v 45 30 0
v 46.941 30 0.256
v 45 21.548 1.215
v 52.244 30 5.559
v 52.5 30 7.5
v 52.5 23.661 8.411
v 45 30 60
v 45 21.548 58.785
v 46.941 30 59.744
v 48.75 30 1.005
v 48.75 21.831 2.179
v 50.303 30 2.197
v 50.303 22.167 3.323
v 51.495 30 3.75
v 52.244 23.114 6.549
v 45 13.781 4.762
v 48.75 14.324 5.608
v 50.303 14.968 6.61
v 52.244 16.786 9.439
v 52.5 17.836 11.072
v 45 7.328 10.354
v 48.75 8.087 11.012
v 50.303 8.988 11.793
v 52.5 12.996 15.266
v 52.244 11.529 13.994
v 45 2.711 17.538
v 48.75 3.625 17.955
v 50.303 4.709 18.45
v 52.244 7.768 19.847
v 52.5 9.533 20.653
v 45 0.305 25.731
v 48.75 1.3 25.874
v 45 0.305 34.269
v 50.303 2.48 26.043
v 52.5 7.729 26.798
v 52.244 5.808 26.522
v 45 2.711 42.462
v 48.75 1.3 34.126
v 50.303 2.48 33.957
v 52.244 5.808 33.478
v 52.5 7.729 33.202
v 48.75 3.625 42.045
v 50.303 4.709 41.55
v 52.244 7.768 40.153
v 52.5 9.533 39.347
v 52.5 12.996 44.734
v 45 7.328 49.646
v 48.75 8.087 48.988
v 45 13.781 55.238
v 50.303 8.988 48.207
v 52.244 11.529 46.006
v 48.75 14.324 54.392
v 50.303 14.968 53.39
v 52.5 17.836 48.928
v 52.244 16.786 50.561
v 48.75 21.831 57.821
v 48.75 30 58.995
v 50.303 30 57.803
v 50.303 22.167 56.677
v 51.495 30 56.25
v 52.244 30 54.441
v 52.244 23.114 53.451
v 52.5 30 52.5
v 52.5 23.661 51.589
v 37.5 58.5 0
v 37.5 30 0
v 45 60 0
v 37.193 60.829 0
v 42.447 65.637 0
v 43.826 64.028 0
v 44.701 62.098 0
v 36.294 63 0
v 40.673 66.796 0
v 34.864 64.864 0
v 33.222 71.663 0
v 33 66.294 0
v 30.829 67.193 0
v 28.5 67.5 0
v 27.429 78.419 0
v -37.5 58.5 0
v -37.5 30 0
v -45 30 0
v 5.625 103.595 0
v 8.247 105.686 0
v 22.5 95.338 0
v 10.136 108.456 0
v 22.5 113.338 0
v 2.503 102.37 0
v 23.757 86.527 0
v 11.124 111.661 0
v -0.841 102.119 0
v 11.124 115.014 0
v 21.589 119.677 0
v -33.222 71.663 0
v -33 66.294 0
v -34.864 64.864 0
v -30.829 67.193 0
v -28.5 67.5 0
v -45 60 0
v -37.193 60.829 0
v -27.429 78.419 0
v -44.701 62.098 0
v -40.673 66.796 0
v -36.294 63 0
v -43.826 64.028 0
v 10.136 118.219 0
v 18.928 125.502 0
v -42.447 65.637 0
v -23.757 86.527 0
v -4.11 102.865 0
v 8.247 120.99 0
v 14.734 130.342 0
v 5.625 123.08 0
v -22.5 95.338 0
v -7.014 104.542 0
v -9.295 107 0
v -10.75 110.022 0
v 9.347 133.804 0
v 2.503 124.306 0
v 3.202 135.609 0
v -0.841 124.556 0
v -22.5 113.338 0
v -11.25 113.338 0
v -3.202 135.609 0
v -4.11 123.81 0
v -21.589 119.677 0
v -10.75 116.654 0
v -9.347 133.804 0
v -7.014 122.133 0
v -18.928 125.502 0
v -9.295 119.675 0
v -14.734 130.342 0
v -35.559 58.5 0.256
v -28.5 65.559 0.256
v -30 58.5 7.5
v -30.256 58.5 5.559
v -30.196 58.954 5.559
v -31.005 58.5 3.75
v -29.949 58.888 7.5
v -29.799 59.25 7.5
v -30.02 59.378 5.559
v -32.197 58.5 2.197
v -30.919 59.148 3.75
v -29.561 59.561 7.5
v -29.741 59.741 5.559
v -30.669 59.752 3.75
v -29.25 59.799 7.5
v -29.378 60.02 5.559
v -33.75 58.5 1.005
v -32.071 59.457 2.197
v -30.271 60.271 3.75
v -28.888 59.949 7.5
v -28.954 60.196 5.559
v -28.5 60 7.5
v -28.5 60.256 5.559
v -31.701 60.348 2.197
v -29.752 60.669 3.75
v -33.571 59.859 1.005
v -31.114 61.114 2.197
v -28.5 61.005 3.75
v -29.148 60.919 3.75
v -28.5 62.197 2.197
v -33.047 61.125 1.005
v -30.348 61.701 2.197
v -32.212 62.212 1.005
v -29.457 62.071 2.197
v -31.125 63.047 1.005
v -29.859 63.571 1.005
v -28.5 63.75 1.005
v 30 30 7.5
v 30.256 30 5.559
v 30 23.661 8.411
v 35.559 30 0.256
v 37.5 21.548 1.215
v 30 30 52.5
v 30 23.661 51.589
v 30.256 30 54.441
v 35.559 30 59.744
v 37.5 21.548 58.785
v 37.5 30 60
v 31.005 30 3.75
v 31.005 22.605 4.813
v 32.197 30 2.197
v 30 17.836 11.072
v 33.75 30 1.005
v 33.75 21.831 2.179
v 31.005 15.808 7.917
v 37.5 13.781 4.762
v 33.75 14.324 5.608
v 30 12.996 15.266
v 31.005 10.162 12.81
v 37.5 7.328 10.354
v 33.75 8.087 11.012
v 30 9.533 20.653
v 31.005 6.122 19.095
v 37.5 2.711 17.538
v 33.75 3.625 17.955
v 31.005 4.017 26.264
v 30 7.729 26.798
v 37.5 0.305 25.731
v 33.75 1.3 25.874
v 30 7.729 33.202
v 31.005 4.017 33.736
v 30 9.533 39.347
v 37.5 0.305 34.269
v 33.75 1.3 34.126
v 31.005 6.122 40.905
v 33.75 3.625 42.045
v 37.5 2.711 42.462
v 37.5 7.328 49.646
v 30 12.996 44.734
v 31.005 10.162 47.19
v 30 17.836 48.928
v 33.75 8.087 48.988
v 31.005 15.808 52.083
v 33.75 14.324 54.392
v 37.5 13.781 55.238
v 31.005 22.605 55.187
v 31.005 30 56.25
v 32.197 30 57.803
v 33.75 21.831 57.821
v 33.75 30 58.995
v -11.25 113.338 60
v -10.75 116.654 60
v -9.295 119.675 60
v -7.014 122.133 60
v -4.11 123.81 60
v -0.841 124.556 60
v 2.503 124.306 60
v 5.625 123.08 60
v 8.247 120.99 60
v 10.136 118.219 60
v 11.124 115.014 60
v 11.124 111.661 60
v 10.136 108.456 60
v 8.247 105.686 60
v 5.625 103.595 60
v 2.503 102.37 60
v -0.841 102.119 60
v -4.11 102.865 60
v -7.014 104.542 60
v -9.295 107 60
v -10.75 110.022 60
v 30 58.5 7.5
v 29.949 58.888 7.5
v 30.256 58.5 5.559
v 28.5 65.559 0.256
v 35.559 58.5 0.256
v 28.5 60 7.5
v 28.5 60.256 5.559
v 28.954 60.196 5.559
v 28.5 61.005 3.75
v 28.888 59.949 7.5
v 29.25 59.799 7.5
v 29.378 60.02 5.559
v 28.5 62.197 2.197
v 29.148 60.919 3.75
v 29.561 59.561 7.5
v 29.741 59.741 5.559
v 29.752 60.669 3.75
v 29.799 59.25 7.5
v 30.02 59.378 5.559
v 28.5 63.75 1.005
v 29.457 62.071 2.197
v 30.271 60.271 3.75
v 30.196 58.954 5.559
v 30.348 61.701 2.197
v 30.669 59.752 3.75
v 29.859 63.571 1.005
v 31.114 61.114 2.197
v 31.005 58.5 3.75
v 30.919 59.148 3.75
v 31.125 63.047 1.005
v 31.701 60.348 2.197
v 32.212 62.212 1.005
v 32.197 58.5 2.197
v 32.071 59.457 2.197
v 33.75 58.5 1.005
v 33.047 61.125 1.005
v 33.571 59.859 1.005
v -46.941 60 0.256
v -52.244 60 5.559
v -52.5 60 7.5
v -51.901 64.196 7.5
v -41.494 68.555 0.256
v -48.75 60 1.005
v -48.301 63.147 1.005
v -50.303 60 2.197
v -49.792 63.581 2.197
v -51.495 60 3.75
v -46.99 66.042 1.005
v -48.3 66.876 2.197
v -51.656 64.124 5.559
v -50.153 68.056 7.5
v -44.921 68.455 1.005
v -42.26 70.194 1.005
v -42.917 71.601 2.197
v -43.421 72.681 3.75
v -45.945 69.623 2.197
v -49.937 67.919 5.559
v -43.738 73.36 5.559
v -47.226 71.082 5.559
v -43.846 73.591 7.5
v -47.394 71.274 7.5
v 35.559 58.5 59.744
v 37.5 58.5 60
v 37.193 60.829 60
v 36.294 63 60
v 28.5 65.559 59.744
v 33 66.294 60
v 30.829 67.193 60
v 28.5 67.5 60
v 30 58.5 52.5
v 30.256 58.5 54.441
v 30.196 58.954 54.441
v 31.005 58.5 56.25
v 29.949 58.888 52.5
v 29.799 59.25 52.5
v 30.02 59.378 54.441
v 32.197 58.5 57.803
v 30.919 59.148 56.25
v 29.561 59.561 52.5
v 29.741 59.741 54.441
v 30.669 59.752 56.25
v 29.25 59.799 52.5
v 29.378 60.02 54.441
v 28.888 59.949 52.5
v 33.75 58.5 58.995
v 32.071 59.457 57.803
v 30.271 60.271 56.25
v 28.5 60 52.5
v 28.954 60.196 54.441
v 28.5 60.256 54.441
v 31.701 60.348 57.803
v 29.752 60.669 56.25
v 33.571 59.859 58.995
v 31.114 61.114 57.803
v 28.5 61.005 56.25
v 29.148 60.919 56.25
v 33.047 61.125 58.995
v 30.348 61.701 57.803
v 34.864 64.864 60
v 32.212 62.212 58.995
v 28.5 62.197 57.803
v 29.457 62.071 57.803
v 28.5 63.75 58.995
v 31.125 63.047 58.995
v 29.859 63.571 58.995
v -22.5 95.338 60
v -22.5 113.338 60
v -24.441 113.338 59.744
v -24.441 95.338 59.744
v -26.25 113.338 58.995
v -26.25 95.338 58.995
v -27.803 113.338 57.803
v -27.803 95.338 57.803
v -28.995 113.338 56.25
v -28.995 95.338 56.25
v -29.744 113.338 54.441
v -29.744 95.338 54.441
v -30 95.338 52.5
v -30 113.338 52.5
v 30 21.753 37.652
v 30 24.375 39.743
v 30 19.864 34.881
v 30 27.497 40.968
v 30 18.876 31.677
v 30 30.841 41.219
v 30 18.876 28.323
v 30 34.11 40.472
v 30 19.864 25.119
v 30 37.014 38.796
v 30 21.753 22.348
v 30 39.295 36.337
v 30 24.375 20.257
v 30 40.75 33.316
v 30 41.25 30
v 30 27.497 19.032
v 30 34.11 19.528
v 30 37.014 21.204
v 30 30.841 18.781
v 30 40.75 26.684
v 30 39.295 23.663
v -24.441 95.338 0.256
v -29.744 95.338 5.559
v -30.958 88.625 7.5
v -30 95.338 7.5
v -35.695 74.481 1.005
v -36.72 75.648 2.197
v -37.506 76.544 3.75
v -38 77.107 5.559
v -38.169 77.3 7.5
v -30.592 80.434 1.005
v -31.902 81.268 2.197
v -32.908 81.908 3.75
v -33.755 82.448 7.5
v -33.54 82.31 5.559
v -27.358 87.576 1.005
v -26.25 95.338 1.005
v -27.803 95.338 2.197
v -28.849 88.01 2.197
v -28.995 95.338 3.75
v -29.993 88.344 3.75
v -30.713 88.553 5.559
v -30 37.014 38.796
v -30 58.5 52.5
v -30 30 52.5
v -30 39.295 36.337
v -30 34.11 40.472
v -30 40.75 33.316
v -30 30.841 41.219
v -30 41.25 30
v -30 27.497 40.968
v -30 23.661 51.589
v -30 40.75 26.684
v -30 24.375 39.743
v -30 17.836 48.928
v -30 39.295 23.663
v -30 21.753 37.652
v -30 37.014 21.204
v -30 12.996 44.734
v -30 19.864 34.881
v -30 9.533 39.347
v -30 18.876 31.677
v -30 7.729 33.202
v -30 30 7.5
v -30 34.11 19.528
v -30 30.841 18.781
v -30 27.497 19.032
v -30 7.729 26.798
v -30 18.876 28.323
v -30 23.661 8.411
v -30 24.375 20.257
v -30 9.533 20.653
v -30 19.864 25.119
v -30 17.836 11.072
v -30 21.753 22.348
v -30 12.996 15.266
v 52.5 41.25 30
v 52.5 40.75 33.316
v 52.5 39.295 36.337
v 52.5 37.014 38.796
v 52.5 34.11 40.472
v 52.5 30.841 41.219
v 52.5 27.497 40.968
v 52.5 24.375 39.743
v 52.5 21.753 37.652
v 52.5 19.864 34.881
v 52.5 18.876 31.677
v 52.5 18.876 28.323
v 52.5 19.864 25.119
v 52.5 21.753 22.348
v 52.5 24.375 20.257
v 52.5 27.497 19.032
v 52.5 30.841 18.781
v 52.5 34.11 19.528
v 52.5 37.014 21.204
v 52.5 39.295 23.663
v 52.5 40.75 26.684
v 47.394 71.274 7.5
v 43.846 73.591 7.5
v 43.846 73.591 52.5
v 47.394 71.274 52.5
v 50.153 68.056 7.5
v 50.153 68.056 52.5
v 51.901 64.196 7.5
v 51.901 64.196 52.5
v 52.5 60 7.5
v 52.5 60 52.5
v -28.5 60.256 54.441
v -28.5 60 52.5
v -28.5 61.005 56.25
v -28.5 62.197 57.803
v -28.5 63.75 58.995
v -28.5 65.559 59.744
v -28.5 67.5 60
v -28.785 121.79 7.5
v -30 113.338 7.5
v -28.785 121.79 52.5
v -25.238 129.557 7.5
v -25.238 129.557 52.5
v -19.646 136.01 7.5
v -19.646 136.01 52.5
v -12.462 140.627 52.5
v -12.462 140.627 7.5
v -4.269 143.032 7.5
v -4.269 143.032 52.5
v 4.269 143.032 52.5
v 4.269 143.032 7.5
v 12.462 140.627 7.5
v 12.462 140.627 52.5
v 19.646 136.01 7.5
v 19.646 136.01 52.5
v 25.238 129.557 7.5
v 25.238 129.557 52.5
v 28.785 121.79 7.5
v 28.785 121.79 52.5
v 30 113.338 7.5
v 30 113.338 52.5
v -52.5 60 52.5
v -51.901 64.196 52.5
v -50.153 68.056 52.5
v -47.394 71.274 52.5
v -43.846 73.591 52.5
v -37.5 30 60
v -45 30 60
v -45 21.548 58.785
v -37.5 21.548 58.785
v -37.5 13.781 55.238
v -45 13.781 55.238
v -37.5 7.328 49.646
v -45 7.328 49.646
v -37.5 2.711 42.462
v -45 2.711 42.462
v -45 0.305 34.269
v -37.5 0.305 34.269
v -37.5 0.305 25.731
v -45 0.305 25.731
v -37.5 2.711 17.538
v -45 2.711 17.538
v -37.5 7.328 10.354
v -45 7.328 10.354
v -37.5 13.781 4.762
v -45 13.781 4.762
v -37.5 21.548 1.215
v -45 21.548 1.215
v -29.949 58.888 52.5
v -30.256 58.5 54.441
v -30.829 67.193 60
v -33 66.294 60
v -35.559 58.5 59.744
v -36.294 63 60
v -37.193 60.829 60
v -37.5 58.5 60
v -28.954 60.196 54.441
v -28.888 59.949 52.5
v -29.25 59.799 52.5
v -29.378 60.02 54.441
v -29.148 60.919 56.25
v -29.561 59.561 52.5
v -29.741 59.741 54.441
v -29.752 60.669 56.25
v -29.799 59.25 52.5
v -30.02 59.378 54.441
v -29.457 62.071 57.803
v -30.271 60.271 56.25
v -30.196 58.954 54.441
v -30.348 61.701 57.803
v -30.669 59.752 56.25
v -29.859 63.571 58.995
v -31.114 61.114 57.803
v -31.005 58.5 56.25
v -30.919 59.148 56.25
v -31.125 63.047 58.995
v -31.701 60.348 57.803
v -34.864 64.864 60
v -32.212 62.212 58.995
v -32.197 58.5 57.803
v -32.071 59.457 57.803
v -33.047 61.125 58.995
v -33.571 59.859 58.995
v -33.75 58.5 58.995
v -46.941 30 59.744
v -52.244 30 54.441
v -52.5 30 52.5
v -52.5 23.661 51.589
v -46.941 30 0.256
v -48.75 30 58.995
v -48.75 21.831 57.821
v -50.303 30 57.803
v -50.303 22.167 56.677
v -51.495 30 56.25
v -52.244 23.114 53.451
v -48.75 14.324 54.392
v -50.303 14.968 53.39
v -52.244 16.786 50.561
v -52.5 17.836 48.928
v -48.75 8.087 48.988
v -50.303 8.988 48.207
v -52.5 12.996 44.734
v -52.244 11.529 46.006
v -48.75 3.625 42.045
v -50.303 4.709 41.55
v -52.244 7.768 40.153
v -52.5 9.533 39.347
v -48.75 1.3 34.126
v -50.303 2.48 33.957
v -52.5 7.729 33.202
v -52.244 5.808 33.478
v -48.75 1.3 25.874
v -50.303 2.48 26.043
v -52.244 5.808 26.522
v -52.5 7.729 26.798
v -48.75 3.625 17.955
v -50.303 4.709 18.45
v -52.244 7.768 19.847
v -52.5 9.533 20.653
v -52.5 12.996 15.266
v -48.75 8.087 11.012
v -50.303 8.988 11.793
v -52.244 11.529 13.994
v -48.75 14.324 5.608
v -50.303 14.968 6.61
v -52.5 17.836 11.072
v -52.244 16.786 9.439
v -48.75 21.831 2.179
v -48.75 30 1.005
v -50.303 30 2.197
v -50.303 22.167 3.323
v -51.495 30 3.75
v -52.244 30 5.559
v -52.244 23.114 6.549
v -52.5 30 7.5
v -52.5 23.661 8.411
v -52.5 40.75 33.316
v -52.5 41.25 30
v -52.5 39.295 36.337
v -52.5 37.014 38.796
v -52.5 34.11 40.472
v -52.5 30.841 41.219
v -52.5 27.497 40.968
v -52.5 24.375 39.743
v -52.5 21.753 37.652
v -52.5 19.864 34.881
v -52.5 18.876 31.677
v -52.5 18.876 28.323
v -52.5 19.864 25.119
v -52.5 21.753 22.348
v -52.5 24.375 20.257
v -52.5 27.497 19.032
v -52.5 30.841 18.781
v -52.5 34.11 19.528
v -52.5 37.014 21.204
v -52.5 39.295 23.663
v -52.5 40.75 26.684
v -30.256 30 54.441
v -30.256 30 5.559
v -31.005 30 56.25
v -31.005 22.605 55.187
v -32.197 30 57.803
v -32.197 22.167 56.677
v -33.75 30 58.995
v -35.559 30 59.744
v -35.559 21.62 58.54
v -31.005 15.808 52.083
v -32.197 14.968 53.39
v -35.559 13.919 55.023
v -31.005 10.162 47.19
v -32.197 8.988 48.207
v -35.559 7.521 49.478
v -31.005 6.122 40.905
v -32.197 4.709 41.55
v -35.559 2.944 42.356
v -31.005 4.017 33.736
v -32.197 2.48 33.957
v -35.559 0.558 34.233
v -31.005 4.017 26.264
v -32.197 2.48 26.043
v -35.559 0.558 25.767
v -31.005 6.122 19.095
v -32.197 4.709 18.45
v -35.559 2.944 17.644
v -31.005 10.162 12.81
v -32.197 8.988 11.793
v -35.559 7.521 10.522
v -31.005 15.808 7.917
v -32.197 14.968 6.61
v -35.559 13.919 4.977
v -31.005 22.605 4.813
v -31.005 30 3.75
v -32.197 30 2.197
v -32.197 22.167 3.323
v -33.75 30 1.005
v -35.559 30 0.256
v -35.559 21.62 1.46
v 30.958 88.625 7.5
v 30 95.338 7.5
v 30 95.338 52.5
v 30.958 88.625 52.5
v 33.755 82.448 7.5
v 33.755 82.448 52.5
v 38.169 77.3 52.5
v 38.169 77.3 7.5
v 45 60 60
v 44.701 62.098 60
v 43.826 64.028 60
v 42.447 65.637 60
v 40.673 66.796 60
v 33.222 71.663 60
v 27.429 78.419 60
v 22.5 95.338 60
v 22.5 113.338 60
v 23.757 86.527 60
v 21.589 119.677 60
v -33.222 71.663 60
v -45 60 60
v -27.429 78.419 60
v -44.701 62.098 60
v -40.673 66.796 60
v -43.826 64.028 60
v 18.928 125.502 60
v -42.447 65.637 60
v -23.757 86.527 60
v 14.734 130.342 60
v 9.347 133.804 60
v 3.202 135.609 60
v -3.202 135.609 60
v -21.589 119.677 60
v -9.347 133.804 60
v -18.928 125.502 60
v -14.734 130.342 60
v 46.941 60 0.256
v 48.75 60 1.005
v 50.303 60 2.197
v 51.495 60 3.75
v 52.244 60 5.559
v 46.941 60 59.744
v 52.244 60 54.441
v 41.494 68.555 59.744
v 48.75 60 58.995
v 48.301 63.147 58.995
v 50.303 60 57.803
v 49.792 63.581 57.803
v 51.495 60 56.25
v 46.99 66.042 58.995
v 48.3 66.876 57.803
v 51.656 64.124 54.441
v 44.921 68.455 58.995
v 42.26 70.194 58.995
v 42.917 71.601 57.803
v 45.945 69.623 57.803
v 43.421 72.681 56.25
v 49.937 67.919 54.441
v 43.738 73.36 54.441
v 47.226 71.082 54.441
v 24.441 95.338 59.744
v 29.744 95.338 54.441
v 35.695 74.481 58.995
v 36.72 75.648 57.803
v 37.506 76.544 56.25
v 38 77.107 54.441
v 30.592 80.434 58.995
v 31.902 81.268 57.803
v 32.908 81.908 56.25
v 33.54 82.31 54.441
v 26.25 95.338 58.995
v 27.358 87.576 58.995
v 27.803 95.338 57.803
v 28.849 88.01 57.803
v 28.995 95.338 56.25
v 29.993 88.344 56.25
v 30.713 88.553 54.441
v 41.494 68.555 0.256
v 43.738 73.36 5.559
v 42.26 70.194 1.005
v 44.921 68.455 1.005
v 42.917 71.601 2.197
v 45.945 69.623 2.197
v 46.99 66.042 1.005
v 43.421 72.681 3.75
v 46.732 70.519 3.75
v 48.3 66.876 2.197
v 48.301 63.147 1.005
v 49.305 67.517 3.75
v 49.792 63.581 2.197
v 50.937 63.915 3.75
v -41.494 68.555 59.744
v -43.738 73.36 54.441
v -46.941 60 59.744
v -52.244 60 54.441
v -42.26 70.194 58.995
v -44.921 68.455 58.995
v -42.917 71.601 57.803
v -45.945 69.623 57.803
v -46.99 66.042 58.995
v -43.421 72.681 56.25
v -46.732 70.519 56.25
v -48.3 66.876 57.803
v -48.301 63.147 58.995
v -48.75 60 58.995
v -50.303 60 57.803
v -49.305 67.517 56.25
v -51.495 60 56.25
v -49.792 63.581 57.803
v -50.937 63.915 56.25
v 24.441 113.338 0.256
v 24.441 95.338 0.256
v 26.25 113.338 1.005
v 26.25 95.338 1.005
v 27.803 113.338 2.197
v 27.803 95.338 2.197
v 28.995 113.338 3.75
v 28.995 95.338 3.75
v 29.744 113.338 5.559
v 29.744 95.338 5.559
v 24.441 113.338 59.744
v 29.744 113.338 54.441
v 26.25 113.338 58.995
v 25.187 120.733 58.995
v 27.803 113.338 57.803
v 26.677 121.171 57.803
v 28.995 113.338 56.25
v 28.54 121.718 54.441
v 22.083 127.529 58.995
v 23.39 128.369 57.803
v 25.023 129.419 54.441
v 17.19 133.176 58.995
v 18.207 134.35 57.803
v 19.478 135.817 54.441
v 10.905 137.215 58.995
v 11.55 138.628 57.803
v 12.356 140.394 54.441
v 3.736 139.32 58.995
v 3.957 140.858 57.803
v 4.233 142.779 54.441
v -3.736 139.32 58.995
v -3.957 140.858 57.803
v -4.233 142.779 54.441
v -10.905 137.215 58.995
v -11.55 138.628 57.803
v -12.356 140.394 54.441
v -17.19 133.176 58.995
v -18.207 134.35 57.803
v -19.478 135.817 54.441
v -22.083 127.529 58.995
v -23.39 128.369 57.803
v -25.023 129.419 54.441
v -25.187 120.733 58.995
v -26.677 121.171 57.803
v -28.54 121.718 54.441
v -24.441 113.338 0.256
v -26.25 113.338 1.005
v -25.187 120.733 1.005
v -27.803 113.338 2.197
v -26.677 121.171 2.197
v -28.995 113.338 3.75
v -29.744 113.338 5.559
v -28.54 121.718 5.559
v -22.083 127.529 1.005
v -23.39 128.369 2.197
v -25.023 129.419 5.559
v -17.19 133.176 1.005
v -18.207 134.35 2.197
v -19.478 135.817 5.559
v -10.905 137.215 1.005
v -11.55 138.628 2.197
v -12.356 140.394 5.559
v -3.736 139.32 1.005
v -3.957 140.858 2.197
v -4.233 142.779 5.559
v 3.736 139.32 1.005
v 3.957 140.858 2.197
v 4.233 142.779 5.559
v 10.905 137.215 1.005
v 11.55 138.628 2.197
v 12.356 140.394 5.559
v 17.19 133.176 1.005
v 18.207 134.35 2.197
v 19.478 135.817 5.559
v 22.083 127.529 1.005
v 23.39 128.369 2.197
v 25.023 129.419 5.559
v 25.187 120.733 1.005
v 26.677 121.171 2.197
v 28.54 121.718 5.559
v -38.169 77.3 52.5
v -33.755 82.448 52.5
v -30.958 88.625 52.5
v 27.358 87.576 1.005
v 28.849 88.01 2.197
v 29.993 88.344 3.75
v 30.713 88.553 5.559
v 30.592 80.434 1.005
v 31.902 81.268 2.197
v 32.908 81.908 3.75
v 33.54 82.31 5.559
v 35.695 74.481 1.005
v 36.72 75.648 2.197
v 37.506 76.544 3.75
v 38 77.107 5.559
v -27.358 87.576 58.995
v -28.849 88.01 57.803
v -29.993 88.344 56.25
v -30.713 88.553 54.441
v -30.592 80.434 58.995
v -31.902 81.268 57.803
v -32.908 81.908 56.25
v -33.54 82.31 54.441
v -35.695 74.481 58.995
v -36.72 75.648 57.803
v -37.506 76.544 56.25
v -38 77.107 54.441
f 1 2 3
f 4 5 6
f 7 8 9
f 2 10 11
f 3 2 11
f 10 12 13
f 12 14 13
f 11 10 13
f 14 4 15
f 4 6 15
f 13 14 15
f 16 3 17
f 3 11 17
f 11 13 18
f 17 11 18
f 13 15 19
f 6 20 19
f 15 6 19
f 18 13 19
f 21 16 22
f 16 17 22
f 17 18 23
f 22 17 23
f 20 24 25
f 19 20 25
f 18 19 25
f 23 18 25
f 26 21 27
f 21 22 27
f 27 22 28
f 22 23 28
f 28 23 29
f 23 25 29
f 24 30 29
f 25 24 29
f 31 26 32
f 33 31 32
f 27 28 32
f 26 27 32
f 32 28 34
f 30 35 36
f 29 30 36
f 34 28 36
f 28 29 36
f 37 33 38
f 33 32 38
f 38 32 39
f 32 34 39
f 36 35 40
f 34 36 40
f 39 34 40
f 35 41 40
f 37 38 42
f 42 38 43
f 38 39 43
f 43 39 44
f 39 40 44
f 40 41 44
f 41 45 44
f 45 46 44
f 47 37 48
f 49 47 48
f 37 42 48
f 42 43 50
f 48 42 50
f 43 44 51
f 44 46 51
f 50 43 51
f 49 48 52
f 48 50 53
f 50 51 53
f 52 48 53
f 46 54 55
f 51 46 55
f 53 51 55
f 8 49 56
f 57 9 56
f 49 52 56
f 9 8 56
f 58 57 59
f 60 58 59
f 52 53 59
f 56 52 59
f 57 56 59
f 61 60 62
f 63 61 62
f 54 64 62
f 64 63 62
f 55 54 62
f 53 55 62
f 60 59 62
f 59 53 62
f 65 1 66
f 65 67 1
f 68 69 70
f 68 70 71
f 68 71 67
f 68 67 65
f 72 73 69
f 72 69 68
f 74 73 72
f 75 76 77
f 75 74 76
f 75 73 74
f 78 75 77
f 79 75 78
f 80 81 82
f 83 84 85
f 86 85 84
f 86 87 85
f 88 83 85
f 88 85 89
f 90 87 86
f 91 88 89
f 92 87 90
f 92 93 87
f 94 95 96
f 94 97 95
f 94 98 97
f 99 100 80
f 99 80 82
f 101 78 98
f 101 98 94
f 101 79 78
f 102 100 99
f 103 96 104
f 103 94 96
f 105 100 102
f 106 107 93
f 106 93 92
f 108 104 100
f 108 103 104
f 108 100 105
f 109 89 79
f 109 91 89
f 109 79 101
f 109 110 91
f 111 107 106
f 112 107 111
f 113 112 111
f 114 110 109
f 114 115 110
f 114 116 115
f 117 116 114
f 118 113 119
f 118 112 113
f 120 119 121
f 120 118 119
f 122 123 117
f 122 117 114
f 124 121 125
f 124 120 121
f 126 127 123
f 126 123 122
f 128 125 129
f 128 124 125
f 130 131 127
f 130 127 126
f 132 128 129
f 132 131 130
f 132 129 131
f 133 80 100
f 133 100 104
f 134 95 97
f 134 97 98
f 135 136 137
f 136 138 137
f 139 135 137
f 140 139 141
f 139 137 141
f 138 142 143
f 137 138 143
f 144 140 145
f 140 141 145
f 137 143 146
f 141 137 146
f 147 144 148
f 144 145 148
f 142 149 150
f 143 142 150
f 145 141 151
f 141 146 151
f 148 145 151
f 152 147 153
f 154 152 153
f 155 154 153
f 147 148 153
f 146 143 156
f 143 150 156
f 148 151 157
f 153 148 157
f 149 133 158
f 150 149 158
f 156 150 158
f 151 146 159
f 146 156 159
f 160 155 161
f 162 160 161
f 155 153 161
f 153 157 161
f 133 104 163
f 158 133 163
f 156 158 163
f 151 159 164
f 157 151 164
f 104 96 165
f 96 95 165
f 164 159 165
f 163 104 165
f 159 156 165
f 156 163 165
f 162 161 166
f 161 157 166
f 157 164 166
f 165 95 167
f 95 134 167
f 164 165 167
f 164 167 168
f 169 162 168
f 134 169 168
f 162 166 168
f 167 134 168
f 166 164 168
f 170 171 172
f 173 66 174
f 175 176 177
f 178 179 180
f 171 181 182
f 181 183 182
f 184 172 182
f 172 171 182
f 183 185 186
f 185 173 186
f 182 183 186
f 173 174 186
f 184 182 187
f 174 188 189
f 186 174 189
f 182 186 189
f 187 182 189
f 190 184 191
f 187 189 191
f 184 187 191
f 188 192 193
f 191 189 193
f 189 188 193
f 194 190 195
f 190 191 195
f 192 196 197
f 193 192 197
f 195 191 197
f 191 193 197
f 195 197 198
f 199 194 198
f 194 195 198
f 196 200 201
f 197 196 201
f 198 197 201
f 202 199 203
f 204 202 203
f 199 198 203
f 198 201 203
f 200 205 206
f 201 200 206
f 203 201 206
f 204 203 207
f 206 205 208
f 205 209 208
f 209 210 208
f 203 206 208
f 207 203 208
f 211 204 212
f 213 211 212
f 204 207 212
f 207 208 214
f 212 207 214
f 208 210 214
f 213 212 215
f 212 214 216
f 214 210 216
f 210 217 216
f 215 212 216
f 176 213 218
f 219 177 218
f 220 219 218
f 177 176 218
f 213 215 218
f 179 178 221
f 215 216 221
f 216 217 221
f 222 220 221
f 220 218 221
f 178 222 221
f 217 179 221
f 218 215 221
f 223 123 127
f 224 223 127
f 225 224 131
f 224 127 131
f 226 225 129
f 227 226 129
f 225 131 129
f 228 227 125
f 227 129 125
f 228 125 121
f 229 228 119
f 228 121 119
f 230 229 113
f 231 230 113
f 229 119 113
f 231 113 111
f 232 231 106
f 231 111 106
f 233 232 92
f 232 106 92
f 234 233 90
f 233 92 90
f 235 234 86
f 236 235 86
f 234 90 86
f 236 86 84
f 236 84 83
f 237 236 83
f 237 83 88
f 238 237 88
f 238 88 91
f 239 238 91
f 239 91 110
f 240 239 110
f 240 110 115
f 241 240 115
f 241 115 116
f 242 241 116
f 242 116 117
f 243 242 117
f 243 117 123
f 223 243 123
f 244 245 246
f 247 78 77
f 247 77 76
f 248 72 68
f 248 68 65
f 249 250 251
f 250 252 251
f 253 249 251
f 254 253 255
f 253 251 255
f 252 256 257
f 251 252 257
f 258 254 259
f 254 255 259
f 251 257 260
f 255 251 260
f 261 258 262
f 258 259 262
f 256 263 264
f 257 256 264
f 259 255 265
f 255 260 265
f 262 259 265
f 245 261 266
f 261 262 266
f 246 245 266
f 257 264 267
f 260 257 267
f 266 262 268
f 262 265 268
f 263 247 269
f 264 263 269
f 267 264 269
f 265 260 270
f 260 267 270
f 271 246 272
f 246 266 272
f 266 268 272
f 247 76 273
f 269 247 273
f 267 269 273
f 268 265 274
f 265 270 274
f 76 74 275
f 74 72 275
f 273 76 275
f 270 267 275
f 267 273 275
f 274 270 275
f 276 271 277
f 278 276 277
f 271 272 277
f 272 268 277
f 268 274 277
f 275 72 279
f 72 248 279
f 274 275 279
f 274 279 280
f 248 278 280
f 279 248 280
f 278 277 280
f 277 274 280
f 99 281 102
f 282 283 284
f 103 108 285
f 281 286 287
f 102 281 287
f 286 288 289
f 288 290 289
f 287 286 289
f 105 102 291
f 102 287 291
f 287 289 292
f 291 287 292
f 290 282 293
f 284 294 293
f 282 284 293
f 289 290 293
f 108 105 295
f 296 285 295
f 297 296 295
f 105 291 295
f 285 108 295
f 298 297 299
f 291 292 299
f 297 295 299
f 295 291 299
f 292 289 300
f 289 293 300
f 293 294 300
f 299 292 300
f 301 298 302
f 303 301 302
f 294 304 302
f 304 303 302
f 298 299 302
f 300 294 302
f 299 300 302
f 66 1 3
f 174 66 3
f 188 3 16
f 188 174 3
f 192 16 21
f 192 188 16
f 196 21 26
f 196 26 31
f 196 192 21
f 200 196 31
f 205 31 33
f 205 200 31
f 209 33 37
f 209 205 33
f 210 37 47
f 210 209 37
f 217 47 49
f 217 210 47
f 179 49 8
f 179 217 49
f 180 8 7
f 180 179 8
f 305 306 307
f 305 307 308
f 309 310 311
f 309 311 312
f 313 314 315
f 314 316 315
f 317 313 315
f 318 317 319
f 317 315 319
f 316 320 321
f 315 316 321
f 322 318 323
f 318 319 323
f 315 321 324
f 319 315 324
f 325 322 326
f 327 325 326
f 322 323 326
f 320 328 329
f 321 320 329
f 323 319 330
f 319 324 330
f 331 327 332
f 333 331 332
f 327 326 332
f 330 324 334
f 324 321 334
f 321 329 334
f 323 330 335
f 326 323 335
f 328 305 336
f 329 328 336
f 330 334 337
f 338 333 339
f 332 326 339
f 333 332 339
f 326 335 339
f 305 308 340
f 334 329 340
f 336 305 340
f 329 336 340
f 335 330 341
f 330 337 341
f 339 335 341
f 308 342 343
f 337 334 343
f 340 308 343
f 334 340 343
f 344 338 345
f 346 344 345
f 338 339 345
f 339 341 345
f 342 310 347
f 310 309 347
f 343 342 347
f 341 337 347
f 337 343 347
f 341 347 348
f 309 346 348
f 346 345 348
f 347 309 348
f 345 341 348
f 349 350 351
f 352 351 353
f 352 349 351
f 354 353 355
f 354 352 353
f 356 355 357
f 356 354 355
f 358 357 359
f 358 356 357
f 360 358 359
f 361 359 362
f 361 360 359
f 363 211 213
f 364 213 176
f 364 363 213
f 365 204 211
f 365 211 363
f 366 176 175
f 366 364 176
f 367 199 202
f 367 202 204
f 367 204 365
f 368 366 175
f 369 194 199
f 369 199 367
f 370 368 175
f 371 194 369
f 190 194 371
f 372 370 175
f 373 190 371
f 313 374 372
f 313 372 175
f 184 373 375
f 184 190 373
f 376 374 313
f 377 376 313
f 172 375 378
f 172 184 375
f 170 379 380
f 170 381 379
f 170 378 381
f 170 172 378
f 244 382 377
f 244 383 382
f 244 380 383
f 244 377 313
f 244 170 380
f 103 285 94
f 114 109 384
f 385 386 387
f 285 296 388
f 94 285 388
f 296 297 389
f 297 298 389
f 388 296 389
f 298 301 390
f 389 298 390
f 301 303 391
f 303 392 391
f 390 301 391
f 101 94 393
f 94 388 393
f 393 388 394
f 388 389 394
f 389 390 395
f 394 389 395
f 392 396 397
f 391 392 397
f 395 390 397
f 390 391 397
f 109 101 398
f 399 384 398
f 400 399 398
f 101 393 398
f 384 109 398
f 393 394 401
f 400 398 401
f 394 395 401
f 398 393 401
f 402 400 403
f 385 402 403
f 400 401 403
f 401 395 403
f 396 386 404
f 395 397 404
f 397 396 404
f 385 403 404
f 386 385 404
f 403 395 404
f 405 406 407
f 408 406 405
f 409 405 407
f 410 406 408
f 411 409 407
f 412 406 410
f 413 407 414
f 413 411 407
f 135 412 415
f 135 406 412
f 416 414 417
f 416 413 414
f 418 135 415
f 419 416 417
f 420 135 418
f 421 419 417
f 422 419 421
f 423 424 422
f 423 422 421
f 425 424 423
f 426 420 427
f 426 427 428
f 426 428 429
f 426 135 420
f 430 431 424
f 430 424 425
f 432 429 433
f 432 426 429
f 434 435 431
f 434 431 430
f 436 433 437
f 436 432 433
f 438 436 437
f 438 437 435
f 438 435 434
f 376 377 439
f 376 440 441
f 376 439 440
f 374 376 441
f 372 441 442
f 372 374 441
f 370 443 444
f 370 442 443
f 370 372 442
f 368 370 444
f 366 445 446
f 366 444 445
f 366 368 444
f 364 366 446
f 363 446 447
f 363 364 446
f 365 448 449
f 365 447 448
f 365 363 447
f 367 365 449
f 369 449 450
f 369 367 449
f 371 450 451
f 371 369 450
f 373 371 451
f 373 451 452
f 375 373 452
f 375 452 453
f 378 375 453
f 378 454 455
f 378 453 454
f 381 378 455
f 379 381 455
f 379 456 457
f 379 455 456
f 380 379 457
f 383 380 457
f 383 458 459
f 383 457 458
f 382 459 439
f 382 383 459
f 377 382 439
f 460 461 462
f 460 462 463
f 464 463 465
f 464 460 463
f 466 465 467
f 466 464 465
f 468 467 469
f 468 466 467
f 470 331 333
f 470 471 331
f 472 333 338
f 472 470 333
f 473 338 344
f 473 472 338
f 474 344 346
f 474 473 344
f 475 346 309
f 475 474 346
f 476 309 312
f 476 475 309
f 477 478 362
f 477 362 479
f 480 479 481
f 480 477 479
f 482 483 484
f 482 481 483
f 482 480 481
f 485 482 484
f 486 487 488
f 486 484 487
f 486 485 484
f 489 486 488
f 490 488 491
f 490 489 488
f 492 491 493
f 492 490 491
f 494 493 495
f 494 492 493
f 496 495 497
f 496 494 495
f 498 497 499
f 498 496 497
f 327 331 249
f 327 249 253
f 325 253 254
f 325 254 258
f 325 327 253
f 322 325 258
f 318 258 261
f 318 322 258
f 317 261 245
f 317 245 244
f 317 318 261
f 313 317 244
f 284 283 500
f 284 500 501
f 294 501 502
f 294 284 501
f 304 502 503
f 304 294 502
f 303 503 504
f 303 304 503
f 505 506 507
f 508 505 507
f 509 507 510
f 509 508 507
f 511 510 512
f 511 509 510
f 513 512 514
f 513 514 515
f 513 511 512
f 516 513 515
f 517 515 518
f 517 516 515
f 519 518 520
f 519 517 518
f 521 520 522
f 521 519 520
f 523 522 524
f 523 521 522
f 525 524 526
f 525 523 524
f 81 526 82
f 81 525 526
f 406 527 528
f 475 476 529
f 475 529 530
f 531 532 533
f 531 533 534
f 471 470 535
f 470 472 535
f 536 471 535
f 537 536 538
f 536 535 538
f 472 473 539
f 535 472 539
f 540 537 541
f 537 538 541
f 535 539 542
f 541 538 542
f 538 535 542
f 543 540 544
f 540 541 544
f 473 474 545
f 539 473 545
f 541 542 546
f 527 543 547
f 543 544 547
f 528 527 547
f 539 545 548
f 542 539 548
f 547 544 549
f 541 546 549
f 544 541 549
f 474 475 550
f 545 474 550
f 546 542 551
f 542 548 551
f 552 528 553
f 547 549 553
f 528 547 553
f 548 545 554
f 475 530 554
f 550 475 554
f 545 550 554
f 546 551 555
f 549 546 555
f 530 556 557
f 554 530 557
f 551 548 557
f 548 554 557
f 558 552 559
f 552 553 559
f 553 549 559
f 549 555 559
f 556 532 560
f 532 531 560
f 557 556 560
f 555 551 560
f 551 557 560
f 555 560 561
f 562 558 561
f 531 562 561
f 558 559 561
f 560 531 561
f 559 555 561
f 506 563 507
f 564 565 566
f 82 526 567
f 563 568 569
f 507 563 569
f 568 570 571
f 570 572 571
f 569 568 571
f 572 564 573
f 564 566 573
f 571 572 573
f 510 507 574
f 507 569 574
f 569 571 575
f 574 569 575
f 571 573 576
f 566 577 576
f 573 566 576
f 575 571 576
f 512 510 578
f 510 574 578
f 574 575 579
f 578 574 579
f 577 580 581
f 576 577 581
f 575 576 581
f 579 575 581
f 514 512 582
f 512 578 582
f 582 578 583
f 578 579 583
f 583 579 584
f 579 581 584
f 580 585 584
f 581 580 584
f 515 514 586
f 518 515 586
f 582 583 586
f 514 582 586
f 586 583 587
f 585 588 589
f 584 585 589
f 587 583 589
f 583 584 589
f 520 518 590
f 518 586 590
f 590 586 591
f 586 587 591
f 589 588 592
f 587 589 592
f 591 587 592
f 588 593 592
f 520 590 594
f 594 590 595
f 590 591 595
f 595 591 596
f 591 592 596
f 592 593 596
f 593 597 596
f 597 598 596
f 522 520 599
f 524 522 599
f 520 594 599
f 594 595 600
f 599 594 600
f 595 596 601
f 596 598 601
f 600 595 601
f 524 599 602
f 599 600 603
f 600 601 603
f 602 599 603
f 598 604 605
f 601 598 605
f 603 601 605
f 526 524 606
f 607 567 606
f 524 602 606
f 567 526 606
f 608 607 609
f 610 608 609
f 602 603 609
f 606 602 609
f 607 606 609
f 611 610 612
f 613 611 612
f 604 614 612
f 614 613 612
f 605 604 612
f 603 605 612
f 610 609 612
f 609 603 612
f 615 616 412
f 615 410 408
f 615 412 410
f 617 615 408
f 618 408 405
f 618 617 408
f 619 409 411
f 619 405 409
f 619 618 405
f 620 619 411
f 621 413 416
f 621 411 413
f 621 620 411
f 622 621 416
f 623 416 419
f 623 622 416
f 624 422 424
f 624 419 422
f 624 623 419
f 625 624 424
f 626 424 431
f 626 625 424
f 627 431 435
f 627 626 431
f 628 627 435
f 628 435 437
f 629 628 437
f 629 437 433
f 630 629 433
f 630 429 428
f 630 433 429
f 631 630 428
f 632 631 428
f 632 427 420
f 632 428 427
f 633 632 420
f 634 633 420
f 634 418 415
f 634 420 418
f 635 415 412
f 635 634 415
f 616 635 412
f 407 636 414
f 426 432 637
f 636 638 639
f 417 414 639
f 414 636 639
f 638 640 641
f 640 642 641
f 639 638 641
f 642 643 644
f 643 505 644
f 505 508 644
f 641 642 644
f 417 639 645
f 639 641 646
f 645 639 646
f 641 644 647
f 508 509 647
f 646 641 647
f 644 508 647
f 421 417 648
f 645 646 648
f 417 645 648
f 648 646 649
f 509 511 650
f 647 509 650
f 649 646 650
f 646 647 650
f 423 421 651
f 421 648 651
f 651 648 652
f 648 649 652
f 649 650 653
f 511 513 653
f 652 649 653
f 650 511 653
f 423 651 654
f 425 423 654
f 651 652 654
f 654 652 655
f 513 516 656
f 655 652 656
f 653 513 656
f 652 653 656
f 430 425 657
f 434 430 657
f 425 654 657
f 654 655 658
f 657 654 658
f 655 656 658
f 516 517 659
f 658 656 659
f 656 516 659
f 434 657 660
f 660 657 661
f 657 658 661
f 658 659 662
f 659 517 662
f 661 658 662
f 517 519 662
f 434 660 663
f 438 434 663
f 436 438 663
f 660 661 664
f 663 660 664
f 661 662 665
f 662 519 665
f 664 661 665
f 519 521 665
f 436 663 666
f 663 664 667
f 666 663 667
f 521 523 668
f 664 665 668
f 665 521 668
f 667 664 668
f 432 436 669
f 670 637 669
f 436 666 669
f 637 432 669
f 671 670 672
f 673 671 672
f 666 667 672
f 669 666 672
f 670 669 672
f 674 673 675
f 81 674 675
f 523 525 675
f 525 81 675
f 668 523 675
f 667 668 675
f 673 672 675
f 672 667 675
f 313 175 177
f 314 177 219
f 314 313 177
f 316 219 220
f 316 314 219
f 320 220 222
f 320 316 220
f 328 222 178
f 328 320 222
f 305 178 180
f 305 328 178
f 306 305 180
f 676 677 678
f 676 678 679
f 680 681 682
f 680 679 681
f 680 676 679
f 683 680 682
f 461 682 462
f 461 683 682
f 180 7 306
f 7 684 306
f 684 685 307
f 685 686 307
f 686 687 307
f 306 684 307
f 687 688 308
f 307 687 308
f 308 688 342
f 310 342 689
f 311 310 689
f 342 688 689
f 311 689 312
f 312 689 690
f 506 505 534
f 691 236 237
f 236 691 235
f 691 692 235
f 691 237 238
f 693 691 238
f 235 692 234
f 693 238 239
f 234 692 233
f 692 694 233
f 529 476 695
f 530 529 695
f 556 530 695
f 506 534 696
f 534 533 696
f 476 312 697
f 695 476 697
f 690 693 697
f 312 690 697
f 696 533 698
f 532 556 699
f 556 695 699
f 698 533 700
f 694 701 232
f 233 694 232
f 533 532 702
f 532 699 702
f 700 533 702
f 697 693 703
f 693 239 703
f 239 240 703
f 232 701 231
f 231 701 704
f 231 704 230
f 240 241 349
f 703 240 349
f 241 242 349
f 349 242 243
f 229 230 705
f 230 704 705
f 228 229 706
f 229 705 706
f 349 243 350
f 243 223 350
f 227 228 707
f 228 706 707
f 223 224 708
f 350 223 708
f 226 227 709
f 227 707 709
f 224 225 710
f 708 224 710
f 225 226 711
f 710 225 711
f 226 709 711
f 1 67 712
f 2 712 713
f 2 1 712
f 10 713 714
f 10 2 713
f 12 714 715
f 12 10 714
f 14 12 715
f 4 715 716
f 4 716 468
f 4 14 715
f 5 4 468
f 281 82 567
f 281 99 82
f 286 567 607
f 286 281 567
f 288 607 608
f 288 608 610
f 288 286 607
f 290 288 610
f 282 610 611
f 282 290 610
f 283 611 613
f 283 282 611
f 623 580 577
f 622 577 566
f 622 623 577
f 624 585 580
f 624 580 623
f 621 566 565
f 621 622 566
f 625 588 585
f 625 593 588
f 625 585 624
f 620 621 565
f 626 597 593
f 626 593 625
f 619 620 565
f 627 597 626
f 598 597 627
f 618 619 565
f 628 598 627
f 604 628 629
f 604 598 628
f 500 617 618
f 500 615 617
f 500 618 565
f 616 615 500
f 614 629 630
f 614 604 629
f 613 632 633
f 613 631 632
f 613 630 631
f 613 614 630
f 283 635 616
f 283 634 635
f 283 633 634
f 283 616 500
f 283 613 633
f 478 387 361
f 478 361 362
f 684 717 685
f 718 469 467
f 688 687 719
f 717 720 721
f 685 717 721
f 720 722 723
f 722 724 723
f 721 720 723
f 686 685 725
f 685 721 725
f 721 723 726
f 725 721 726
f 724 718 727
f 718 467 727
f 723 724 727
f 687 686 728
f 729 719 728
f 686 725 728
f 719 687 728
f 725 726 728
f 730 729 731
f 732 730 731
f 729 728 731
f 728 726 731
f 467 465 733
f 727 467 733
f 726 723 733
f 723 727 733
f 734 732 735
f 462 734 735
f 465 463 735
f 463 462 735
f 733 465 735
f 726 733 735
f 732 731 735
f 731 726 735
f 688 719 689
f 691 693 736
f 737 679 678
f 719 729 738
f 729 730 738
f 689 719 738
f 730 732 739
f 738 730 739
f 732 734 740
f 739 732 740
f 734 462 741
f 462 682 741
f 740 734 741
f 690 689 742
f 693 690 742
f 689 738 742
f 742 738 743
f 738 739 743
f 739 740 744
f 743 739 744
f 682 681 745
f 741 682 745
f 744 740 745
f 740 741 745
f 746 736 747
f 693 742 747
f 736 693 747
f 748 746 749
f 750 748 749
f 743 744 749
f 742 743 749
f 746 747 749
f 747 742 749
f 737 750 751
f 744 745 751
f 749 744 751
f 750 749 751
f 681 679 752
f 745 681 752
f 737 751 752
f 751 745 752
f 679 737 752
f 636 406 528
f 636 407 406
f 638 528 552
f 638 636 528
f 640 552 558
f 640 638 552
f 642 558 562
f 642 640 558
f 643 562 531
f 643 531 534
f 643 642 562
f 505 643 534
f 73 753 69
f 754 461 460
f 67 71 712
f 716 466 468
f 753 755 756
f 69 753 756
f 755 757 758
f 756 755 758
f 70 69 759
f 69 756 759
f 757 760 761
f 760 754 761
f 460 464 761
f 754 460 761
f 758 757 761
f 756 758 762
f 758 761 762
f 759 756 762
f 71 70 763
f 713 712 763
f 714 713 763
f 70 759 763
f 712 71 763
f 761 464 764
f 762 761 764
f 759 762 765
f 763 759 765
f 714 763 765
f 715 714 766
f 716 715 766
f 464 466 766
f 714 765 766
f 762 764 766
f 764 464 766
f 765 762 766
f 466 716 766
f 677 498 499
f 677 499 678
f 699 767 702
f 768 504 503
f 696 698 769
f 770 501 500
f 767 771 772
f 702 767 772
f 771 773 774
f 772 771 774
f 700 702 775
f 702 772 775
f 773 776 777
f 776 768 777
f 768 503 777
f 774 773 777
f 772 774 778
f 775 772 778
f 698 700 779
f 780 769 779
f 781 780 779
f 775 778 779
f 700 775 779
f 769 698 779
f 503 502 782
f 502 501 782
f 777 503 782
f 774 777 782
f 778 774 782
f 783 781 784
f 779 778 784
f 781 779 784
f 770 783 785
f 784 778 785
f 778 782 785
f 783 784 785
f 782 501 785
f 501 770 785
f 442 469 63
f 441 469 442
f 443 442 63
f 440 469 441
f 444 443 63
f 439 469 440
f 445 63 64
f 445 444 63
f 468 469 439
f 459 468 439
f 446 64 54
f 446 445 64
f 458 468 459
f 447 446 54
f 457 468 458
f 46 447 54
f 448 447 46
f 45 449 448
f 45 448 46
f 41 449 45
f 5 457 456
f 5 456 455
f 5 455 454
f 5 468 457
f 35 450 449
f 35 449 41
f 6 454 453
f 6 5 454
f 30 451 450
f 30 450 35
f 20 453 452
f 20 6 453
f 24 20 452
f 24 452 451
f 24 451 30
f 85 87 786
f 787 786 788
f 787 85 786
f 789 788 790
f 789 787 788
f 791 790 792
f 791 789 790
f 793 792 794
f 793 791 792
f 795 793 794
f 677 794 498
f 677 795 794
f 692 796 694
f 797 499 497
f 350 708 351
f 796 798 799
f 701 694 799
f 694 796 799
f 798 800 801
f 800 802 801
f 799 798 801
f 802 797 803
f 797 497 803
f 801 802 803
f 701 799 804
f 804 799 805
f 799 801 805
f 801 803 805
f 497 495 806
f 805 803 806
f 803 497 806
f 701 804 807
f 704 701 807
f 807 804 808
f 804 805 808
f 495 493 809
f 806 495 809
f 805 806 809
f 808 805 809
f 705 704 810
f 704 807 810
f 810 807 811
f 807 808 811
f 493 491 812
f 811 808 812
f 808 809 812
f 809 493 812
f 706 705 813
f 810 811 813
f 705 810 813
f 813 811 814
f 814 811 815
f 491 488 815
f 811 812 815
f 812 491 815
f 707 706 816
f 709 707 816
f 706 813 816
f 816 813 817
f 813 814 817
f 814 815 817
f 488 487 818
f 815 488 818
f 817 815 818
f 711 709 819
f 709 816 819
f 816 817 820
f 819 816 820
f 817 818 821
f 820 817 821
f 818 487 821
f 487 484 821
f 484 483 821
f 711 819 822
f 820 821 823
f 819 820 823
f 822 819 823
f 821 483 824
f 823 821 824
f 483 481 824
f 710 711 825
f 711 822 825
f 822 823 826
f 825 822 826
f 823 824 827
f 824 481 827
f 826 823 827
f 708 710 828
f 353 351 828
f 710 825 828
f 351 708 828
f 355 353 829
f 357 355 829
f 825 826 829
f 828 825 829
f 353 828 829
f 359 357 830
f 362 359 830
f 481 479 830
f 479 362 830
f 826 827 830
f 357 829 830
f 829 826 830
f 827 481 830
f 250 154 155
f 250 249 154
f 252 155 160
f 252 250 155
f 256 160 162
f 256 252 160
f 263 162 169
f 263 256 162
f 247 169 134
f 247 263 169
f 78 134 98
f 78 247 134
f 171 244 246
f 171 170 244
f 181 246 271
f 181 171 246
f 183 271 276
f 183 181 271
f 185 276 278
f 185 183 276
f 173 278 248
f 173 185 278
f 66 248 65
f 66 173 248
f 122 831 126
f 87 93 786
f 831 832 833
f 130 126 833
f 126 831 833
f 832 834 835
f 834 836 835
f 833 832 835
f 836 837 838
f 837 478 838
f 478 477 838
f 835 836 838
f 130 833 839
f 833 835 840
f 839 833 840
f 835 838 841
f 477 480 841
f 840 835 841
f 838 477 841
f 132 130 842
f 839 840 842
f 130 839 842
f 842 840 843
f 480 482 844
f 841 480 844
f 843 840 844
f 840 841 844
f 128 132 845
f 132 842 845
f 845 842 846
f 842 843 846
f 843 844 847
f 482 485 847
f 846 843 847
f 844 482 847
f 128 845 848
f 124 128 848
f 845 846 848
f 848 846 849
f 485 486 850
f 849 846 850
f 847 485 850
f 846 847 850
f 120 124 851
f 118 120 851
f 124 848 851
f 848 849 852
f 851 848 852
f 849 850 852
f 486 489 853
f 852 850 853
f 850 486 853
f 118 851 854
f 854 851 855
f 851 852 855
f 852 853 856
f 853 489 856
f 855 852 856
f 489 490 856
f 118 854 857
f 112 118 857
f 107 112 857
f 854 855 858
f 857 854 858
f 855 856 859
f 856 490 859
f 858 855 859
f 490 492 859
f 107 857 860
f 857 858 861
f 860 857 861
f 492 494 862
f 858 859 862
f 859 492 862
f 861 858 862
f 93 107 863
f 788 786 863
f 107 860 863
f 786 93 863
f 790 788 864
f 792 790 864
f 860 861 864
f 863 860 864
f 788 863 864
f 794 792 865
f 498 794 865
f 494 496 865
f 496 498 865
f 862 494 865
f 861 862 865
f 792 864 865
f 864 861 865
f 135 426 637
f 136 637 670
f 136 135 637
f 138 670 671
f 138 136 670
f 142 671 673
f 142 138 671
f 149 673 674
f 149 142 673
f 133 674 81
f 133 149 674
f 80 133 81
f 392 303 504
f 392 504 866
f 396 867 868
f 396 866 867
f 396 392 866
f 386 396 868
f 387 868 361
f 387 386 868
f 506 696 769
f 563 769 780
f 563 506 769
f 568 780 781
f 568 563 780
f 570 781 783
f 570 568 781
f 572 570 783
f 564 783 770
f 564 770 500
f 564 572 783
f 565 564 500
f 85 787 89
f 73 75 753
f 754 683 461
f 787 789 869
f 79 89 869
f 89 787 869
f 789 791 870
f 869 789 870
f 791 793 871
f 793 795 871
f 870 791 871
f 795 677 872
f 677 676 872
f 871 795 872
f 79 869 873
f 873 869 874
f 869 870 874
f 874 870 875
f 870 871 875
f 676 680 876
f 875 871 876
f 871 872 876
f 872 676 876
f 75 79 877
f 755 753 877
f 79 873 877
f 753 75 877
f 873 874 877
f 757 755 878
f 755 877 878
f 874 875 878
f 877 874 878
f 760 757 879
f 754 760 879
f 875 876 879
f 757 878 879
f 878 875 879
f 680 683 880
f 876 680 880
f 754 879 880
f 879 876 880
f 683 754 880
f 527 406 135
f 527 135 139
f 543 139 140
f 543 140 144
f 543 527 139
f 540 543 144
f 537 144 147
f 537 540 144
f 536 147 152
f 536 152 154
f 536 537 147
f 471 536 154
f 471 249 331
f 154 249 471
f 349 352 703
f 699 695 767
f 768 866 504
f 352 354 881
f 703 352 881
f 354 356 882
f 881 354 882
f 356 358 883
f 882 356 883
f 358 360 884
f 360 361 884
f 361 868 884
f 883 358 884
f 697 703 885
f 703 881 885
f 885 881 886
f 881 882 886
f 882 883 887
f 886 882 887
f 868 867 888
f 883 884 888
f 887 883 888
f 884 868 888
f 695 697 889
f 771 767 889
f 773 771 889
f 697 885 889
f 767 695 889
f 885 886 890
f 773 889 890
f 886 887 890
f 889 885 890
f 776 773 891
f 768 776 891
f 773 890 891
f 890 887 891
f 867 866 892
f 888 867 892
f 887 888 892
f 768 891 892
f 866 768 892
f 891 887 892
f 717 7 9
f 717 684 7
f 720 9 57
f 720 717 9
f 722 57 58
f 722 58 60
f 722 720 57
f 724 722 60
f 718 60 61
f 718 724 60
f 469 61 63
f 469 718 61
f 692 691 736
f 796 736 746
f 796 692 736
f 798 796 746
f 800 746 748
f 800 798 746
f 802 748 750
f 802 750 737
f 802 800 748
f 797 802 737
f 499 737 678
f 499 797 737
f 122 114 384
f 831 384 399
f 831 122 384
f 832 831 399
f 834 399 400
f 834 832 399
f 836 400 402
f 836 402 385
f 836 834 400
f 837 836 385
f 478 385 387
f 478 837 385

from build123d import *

# Parameters (mm, degrees)
BOSS_EXTRUDE1_DEPTH     = 60
FILLET2_RADIUS          = 30
FILLET2_LENGTH          = 22.5
FILLET3_RADIUS          = 30
FILLET3_LENGTH          = 22.5
CUT_EXTRUDE1_DEPTH      = 188.538486464
CUT_EXTRUDE1_DEPTH_BACK = 188.538486464
SKETCH2_R               = 11.25
SKETCH3_R               = 11.25
CUT_EXTRUDE2_DEPTH      = 165.018090176
FILLET4_R               = 1.5
FILLET6_R               = 7.5


with BuildPart() as part:
    # Sketch1 → Boss-Extrude1 (new body)
    with BuildSketch(Plane.XY):
        with BuildLine():
            Line((-30, 60), (-30, 0))
            Line((-30, 0), (-52.5, 0))
            Line((-52.5, 0), (-52.5, 60))
            ThreePointArc((-52.5, 60), (-50.152910884, 68.056292333), (-43.846153846, 73.591406526))
            ThreePointArc((-43.846153846, 73.591406526), (-33.755342585, 82.447589235), (-30, 95.337656968))
            Line((-30, 95.337656968), (-30, 113.337656968))
            ThreePointArc((-30, 113.337656968), (0, 143.337656968), (30, 113.337656968))
            Line((30, 113.337656968), (30, 95.337656968))
            ThreePointArc((30, 95.337656968), (33.755342585, 82.447589235), (43.846153846, 73.591406526))
            ThreePointArc((43.846153846, 73.591406526), (50.152910884, 68.056292333), (52.5, 60))
            Line((52.5, 60), (52.5, 0))
            Line((52.5, 0), (30, 0))
            Line((30, 0), (30, 60))
            Line((30, 60), (-30, 60))
        make_face()
    extrude(amount=BOSS_EXTRUDE1_DEPTH)

    # Fillet2: full round fillet: the end face becomes a half cylinder, R = half its width
    fillet2_face = Plane((41.25, 0, 30), x_dir=(-1, 0, 0), z_dir=(0, -1, 0))  # on the end face: x along it, z out of the body
    fillet2_slab = fillet2_face.offset(-FILLET2_RADIUS / 2) * Box(FILLET2_LENGTH, 2 * FILLET2_RADIUS, FILLET2_RADIUS, mode=Mode.PRIVATE)  # the body's end, R deep
    fillet2_round = Plane((41.25, 30, 30), x_dir=(0, -1, 0), z_dir=(-1, 0, 0)) * Cylinder(FILLET2_RADIUS, FILLET2_LENGTH, mode=Mode.PRIVATE)  # its axis R under the face
    add(fillet2_slab - fillet2_round, mode=Mode.SUBTRACT)

    # Fillet3: full round fillet: the end face becomes a half cylinder, R = half its width
    fillet3_face = Plane((-41.25, 0, 30), x_dir=(1, 0, 0), z_dir=(0, -1, 0))  # on the end face: x along it, z out of the body
    fillet3_slab = fillet3_face.offset(-FILLET3_RADIUS / 2) * Box(FILLET3_LENGTH, 2 * FILLET3_RADIUS, FILLET3_RADIUS, mode=Mode.PRIVATE)  # the body's end, R deep
    fillet3_round = Plane((-41.25, 30, 30), x_dir=(0, -1, 0), z_dir=(1, 0, 0)) * Cylinder(FILLET3_RADIUS, FILLET3_LENGTH, mode=Mode.PRIVATE)  # its axis R under the face
    add(fillet3_slab - fillet3_round, mode=Mode.SUBTRACT)

    # Sketch2 → Cut-Extrude1 (cut, two sides: drawn at the far end of the back side and taken through both)
    with BuildSketch(Plane(origin=(52.5, 0, 0), x_dir=(0, 0, -1), z_dir=(1, 0, 0)).offset(-CUT_EXTRUDE1_DEPTH_BACK)):
        with Locations(Location((-30, 30, 0), (0, 0, 90))):
            Circle(SKETCH2_R)
    extrude(amount=CUT_EXTRUDE1_DEPTH + CUT_EXTRUDE1_DEPTH_BACK, mode=Mode.SUBTRACT)

    # Sketch3 → Cut-Extrude2 (cut, through all)
    with BuildSketch(Plane(origin=(0, 0, 0), x_dir=(-1, 0, 0), z_dir=(0, 0, -1))):
        with Locations((0, 113.337656968)):
            Circle(SKETCH3_R)
    extrude(amount=-CUT_EXTRUDE2_DEPTH, mode=Mode.SUBTRACT)

    # Fillet4
    fillet4_edges = [part.edges().sort_by_distance(p)[0] for p in [
        (-30, 60, 30),
        (30, 60, 30),
    ]]
    fillet(fillet4_edges, radius=FILLET4_R)

    # Fillet6
    fillet6_edges = [part.edges().sort_by_distance(p)[0] for p in [
        (-52.5, 45, 0),
        (-50.152910884, 68.056292333, 0),
        (-33.755342585, 82.447589235, 0),
        (-30, 104.337656968, 0),
        (0, 143.337656968, 0),
        (30, 104.337656968, 0),
        (33.755342585, 82.447589235, 0),
        (50.152910884, 68.056292333, 60),
        (50.152910884, 68.056292333, 0),
        (33.755342585, 82.447589235, 60),
        (30, 104.337656968, 60),
        (0, 143.337656968, 60),
        (-30, 104.337656968, 60),
        (-33.755342585, 82.447589235, 60),
        (-50.152910884, 68.056292333, 60),
        (-52.5, 45, 60),
        (52.5, 45, 60),
        (52.5, 45, 0),
        (30, 0, 30),
        (52.5, 0, 30),
        (-30, 44.25, 0),
        (-30, 44.25, 60),
        (-30, 0, 30),
        (-52.5, 0, 30),
        (0, 60, 0),
        (0, 60, 60),
        (30, 44.25, 0),
        (30, 44.25, 60),
        (-29.560660172, 59.560660172, 0),
        (-29.560660172, 59.560660172, 60),
        (29.560660172, 59.560660172, 0),
        (29.560660172, 59.560660172, 60),
    ]]
    fillet(fillet6_edges, radius=FILLET6_R)


solid = part.part
